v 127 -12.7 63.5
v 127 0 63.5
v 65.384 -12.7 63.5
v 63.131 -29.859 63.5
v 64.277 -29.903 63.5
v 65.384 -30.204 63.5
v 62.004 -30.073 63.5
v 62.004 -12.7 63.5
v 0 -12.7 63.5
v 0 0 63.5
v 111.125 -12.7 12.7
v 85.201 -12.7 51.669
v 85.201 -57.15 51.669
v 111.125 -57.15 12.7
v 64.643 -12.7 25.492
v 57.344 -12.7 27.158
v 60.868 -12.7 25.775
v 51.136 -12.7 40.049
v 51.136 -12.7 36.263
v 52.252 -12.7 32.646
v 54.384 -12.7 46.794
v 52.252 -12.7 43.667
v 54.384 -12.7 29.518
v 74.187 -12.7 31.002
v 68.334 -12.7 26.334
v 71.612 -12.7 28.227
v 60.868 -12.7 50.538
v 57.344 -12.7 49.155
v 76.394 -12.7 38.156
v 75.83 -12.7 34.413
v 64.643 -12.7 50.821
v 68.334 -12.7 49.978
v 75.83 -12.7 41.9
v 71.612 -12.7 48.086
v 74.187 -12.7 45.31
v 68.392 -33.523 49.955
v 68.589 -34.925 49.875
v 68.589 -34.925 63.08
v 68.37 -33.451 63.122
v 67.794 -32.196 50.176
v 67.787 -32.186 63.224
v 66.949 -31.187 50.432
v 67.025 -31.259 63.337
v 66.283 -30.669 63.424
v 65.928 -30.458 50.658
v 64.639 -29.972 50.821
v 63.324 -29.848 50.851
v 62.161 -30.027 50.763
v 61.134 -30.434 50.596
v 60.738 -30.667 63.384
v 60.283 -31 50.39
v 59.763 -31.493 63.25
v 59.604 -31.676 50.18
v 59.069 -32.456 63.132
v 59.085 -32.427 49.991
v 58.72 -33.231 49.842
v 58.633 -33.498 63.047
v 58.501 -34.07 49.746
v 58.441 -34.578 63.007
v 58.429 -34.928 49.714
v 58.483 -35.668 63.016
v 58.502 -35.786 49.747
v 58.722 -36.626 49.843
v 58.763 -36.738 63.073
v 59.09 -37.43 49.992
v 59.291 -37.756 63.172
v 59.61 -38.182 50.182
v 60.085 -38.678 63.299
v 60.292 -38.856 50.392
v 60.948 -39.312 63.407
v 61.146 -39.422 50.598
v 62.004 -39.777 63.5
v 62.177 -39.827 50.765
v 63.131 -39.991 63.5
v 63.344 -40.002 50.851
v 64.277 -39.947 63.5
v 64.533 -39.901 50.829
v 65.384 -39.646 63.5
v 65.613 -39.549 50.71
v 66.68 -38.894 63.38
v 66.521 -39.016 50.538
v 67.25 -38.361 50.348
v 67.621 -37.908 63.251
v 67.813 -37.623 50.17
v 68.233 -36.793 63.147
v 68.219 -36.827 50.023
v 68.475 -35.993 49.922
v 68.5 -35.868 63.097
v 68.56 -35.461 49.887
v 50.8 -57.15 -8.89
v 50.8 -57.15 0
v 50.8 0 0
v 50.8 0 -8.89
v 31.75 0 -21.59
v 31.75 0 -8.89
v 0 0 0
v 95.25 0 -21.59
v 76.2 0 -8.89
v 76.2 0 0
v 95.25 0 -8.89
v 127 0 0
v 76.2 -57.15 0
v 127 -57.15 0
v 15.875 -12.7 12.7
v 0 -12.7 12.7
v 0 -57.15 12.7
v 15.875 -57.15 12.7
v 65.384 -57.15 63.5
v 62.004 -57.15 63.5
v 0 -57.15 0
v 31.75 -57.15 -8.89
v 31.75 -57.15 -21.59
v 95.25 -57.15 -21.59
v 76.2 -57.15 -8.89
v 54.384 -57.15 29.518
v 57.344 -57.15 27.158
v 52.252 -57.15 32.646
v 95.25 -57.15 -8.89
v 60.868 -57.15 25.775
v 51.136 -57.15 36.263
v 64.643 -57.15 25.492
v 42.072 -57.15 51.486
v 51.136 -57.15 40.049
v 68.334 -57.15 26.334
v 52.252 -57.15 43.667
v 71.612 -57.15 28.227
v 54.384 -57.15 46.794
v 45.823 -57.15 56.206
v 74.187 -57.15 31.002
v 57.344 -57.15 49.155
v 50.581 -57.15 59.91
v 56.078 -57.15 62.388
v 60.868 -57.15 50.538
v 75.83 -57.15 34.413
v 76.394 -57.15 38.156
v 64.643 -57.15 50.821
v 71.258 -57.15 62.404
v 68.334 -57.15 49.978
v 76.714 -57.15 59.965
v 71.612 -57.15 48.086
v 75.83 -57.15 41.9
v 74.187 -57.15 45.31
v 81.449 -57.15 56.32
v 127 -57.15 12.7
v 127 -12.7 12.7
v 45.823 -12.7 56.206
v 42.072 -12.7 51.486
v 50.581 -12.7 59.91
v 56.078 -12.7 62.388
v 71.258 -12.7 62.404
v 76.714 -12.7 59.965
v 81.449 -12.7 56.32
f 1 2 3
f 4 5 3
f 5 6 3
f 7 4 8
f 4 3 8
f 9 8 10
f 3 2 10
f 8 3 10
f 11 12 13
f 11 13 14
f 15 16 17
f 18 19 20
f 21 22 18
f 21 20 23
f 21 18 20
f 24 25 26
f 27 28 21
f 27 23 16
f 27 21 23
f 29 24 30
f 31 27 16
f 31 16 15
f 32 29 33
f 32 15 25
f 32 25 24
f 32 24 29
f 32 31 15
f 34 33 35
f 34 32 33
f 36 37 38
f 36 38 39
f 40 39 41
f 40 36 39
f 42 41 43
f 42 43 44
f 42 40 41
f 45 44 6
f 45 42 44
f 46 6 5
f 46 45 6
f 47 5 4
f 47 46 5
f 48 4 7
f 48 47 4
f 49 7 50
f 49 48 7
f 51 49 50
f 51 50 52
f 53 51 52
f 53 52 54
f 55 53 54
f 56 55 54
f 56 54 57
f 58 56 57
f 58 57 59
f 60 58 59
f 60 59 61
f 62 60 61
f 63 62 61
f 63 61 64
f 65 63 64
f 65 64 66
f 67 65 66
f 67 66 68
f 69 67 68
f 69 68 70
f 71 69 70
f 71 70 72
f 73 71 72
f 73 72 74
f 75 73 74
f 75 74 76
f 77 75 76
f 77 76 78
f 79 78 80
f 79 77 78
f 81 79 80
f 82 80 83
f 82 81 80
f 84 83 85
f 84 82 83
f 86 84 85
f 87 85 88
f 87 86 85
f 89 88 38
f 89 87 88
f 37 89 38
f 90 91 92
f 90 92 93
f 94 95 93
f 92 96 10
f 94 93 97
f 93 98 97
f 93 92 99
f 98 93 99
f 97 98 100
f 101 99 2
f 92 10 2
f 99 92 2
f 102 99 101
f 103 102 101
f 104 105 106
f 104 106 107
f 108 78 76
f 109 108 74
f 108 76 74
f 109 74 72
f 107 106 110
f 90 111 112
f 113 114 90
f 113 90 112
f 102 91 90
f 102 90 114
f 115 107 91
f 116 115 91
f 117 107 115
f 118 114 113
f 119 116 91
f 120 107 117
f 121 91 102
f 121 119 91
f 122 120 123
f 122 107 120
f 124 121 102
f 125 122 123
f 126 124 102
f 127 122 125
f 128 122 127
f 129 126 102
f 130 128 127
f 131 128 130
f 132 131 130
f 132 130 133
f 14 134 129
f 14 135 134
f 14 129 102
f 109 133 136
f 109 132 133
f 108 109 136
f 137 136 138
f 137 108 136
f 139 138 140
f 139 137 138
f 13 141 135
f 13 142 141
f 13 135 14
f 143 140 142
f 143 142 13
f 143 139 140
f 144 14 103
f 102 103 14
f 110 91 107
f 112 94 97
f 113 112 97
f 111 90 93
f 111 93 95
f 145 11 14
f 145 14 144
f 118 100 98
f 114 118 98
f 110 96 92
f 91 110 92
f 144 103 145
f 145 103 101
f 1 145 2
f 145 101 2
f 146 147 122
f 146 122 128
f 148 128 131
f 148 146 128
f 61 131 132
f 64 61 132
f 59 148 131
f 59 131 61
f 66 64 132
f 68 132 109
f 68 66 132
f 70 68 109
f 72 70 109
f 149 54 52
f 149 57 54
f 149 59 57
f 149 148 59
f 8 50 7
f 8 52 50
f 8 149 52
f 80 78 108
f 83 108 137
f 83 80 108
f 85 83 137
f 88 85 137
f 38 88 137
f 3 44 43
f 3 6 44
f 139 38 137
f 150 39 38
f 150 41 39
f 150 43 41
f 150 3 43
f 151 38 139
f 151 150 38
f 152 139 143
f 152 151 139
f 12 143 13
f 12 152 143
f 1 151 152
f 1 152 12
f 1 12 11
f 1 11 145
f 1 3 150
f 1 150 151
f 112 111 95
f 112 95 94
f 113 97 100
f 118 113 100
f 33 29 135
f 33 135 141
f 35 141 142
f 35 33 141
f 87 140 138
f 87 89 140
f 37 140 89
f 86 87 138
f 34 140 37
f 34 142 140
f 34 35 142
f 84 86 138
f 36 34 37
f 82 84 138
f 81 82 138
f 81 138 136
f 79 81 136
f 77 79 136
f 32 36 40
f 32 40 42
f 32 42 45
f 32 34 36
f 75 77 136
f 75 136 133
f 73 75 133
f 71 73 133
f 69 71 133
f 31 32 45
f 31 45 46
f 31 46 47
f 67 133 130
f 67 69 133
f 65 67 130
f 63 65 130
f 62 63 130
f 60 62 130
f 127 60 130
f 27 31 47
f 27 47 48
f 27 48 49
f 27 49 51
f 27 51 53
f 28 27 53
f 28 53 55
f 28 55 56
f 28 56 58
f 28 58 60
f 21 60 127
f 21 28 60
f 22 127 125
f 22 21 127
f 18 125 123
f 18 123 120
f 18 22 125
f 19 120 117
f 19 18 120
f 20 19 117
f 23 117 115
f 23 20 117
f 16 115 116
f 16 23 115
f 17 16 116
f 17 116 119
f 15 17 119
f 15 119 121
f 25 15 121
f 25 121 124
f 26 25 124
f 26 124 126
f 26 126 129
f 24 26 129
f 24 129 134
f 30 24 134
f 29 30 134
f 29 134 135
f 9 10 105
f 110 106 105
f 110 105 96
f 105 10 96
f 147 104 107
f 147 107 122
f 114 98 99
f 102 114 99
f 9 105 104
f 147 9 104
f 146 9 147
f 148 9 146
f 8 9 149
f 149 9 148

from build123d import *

# Parameters (mm, degrees)
F1_DEPTH = 57.15
F3_START = 12.7
F2_R     = 12.7
F3_DEPTH = 44.45
F5_START = 48.52348
F4_R     = 5.08
F5_DEPTH = 42.4313


with BuildPart() as f1:
    # F0 (on Front) → F1 (new body)
    with BuildSketch(Plane.XZ):
        Polygon((95.25, -8.89), (76.2, -8.89), (76.2, 0), (127, 0), (127, 63.5), (0, 63.5), (0, 0), (50.8, 0), (50.8, -8.89), (31.75, -8.89), (31.75, -21.59), (95.25, -21.59), align=None)
    extrude(amount=F1_DEPTH)

    # F2 (on Front) → F3 (cut)
    with BuildSketch(Plane.XZ.offset(F3_START)):
        with BuildLine():
            Line((127, 63.5), (65.383924195, 63.5))
            ThreePointArc((65.383924195, 63.5), (76.7139126522, 59.9653925056), (85.2011344437, 51.6690586863))
            Line((85.2011344437, 51.6690586863), (111.125, 12.7))
            Line((111.125, 12.7), (127, 12.7))
            Line((127, 12.7), (127, 63.5))
        make_face()
        with BuildLine():
            ThreePointArc((65.383924195, 63.5), (63.693806529, 63.5562926494), (62.0036888631, 63.5))
            Line((62.0036888631, 63.5), (65.383924195, 63.5))
        make_face()
        with BuildLine():
            Line((62.0036888631, 63.5), (0, 63.5))
            Line((0, 63.5), (0, 12.7))
            Line((0, 12.7), (15.875, 12.7))
            Line((15.875, 12.7), (42.0723728562, 51.485718966))
            ThreePointArc((42.0723728562, 51.485718966), (50.5811087271, 59.9098476773), (62.0036888631, 63.5))
        make_face()
        with Locations((63.693806529, 38.1562926494)):
            Circle(F2_R)
    extrude(amount=F3_DEPTH, mode=Mode.SUBTRACT)

    # F4 (on Top) → F5 (cut)
    with BuildSketch(Plane.XY.offset(F5_START)):
        with Locations((63.5088086128, -34.925)):
            Circle(F4_R)
    extrude(amount=F5_DEPTH, mode=Mode.SUBTRACT)


solid = f1.part
